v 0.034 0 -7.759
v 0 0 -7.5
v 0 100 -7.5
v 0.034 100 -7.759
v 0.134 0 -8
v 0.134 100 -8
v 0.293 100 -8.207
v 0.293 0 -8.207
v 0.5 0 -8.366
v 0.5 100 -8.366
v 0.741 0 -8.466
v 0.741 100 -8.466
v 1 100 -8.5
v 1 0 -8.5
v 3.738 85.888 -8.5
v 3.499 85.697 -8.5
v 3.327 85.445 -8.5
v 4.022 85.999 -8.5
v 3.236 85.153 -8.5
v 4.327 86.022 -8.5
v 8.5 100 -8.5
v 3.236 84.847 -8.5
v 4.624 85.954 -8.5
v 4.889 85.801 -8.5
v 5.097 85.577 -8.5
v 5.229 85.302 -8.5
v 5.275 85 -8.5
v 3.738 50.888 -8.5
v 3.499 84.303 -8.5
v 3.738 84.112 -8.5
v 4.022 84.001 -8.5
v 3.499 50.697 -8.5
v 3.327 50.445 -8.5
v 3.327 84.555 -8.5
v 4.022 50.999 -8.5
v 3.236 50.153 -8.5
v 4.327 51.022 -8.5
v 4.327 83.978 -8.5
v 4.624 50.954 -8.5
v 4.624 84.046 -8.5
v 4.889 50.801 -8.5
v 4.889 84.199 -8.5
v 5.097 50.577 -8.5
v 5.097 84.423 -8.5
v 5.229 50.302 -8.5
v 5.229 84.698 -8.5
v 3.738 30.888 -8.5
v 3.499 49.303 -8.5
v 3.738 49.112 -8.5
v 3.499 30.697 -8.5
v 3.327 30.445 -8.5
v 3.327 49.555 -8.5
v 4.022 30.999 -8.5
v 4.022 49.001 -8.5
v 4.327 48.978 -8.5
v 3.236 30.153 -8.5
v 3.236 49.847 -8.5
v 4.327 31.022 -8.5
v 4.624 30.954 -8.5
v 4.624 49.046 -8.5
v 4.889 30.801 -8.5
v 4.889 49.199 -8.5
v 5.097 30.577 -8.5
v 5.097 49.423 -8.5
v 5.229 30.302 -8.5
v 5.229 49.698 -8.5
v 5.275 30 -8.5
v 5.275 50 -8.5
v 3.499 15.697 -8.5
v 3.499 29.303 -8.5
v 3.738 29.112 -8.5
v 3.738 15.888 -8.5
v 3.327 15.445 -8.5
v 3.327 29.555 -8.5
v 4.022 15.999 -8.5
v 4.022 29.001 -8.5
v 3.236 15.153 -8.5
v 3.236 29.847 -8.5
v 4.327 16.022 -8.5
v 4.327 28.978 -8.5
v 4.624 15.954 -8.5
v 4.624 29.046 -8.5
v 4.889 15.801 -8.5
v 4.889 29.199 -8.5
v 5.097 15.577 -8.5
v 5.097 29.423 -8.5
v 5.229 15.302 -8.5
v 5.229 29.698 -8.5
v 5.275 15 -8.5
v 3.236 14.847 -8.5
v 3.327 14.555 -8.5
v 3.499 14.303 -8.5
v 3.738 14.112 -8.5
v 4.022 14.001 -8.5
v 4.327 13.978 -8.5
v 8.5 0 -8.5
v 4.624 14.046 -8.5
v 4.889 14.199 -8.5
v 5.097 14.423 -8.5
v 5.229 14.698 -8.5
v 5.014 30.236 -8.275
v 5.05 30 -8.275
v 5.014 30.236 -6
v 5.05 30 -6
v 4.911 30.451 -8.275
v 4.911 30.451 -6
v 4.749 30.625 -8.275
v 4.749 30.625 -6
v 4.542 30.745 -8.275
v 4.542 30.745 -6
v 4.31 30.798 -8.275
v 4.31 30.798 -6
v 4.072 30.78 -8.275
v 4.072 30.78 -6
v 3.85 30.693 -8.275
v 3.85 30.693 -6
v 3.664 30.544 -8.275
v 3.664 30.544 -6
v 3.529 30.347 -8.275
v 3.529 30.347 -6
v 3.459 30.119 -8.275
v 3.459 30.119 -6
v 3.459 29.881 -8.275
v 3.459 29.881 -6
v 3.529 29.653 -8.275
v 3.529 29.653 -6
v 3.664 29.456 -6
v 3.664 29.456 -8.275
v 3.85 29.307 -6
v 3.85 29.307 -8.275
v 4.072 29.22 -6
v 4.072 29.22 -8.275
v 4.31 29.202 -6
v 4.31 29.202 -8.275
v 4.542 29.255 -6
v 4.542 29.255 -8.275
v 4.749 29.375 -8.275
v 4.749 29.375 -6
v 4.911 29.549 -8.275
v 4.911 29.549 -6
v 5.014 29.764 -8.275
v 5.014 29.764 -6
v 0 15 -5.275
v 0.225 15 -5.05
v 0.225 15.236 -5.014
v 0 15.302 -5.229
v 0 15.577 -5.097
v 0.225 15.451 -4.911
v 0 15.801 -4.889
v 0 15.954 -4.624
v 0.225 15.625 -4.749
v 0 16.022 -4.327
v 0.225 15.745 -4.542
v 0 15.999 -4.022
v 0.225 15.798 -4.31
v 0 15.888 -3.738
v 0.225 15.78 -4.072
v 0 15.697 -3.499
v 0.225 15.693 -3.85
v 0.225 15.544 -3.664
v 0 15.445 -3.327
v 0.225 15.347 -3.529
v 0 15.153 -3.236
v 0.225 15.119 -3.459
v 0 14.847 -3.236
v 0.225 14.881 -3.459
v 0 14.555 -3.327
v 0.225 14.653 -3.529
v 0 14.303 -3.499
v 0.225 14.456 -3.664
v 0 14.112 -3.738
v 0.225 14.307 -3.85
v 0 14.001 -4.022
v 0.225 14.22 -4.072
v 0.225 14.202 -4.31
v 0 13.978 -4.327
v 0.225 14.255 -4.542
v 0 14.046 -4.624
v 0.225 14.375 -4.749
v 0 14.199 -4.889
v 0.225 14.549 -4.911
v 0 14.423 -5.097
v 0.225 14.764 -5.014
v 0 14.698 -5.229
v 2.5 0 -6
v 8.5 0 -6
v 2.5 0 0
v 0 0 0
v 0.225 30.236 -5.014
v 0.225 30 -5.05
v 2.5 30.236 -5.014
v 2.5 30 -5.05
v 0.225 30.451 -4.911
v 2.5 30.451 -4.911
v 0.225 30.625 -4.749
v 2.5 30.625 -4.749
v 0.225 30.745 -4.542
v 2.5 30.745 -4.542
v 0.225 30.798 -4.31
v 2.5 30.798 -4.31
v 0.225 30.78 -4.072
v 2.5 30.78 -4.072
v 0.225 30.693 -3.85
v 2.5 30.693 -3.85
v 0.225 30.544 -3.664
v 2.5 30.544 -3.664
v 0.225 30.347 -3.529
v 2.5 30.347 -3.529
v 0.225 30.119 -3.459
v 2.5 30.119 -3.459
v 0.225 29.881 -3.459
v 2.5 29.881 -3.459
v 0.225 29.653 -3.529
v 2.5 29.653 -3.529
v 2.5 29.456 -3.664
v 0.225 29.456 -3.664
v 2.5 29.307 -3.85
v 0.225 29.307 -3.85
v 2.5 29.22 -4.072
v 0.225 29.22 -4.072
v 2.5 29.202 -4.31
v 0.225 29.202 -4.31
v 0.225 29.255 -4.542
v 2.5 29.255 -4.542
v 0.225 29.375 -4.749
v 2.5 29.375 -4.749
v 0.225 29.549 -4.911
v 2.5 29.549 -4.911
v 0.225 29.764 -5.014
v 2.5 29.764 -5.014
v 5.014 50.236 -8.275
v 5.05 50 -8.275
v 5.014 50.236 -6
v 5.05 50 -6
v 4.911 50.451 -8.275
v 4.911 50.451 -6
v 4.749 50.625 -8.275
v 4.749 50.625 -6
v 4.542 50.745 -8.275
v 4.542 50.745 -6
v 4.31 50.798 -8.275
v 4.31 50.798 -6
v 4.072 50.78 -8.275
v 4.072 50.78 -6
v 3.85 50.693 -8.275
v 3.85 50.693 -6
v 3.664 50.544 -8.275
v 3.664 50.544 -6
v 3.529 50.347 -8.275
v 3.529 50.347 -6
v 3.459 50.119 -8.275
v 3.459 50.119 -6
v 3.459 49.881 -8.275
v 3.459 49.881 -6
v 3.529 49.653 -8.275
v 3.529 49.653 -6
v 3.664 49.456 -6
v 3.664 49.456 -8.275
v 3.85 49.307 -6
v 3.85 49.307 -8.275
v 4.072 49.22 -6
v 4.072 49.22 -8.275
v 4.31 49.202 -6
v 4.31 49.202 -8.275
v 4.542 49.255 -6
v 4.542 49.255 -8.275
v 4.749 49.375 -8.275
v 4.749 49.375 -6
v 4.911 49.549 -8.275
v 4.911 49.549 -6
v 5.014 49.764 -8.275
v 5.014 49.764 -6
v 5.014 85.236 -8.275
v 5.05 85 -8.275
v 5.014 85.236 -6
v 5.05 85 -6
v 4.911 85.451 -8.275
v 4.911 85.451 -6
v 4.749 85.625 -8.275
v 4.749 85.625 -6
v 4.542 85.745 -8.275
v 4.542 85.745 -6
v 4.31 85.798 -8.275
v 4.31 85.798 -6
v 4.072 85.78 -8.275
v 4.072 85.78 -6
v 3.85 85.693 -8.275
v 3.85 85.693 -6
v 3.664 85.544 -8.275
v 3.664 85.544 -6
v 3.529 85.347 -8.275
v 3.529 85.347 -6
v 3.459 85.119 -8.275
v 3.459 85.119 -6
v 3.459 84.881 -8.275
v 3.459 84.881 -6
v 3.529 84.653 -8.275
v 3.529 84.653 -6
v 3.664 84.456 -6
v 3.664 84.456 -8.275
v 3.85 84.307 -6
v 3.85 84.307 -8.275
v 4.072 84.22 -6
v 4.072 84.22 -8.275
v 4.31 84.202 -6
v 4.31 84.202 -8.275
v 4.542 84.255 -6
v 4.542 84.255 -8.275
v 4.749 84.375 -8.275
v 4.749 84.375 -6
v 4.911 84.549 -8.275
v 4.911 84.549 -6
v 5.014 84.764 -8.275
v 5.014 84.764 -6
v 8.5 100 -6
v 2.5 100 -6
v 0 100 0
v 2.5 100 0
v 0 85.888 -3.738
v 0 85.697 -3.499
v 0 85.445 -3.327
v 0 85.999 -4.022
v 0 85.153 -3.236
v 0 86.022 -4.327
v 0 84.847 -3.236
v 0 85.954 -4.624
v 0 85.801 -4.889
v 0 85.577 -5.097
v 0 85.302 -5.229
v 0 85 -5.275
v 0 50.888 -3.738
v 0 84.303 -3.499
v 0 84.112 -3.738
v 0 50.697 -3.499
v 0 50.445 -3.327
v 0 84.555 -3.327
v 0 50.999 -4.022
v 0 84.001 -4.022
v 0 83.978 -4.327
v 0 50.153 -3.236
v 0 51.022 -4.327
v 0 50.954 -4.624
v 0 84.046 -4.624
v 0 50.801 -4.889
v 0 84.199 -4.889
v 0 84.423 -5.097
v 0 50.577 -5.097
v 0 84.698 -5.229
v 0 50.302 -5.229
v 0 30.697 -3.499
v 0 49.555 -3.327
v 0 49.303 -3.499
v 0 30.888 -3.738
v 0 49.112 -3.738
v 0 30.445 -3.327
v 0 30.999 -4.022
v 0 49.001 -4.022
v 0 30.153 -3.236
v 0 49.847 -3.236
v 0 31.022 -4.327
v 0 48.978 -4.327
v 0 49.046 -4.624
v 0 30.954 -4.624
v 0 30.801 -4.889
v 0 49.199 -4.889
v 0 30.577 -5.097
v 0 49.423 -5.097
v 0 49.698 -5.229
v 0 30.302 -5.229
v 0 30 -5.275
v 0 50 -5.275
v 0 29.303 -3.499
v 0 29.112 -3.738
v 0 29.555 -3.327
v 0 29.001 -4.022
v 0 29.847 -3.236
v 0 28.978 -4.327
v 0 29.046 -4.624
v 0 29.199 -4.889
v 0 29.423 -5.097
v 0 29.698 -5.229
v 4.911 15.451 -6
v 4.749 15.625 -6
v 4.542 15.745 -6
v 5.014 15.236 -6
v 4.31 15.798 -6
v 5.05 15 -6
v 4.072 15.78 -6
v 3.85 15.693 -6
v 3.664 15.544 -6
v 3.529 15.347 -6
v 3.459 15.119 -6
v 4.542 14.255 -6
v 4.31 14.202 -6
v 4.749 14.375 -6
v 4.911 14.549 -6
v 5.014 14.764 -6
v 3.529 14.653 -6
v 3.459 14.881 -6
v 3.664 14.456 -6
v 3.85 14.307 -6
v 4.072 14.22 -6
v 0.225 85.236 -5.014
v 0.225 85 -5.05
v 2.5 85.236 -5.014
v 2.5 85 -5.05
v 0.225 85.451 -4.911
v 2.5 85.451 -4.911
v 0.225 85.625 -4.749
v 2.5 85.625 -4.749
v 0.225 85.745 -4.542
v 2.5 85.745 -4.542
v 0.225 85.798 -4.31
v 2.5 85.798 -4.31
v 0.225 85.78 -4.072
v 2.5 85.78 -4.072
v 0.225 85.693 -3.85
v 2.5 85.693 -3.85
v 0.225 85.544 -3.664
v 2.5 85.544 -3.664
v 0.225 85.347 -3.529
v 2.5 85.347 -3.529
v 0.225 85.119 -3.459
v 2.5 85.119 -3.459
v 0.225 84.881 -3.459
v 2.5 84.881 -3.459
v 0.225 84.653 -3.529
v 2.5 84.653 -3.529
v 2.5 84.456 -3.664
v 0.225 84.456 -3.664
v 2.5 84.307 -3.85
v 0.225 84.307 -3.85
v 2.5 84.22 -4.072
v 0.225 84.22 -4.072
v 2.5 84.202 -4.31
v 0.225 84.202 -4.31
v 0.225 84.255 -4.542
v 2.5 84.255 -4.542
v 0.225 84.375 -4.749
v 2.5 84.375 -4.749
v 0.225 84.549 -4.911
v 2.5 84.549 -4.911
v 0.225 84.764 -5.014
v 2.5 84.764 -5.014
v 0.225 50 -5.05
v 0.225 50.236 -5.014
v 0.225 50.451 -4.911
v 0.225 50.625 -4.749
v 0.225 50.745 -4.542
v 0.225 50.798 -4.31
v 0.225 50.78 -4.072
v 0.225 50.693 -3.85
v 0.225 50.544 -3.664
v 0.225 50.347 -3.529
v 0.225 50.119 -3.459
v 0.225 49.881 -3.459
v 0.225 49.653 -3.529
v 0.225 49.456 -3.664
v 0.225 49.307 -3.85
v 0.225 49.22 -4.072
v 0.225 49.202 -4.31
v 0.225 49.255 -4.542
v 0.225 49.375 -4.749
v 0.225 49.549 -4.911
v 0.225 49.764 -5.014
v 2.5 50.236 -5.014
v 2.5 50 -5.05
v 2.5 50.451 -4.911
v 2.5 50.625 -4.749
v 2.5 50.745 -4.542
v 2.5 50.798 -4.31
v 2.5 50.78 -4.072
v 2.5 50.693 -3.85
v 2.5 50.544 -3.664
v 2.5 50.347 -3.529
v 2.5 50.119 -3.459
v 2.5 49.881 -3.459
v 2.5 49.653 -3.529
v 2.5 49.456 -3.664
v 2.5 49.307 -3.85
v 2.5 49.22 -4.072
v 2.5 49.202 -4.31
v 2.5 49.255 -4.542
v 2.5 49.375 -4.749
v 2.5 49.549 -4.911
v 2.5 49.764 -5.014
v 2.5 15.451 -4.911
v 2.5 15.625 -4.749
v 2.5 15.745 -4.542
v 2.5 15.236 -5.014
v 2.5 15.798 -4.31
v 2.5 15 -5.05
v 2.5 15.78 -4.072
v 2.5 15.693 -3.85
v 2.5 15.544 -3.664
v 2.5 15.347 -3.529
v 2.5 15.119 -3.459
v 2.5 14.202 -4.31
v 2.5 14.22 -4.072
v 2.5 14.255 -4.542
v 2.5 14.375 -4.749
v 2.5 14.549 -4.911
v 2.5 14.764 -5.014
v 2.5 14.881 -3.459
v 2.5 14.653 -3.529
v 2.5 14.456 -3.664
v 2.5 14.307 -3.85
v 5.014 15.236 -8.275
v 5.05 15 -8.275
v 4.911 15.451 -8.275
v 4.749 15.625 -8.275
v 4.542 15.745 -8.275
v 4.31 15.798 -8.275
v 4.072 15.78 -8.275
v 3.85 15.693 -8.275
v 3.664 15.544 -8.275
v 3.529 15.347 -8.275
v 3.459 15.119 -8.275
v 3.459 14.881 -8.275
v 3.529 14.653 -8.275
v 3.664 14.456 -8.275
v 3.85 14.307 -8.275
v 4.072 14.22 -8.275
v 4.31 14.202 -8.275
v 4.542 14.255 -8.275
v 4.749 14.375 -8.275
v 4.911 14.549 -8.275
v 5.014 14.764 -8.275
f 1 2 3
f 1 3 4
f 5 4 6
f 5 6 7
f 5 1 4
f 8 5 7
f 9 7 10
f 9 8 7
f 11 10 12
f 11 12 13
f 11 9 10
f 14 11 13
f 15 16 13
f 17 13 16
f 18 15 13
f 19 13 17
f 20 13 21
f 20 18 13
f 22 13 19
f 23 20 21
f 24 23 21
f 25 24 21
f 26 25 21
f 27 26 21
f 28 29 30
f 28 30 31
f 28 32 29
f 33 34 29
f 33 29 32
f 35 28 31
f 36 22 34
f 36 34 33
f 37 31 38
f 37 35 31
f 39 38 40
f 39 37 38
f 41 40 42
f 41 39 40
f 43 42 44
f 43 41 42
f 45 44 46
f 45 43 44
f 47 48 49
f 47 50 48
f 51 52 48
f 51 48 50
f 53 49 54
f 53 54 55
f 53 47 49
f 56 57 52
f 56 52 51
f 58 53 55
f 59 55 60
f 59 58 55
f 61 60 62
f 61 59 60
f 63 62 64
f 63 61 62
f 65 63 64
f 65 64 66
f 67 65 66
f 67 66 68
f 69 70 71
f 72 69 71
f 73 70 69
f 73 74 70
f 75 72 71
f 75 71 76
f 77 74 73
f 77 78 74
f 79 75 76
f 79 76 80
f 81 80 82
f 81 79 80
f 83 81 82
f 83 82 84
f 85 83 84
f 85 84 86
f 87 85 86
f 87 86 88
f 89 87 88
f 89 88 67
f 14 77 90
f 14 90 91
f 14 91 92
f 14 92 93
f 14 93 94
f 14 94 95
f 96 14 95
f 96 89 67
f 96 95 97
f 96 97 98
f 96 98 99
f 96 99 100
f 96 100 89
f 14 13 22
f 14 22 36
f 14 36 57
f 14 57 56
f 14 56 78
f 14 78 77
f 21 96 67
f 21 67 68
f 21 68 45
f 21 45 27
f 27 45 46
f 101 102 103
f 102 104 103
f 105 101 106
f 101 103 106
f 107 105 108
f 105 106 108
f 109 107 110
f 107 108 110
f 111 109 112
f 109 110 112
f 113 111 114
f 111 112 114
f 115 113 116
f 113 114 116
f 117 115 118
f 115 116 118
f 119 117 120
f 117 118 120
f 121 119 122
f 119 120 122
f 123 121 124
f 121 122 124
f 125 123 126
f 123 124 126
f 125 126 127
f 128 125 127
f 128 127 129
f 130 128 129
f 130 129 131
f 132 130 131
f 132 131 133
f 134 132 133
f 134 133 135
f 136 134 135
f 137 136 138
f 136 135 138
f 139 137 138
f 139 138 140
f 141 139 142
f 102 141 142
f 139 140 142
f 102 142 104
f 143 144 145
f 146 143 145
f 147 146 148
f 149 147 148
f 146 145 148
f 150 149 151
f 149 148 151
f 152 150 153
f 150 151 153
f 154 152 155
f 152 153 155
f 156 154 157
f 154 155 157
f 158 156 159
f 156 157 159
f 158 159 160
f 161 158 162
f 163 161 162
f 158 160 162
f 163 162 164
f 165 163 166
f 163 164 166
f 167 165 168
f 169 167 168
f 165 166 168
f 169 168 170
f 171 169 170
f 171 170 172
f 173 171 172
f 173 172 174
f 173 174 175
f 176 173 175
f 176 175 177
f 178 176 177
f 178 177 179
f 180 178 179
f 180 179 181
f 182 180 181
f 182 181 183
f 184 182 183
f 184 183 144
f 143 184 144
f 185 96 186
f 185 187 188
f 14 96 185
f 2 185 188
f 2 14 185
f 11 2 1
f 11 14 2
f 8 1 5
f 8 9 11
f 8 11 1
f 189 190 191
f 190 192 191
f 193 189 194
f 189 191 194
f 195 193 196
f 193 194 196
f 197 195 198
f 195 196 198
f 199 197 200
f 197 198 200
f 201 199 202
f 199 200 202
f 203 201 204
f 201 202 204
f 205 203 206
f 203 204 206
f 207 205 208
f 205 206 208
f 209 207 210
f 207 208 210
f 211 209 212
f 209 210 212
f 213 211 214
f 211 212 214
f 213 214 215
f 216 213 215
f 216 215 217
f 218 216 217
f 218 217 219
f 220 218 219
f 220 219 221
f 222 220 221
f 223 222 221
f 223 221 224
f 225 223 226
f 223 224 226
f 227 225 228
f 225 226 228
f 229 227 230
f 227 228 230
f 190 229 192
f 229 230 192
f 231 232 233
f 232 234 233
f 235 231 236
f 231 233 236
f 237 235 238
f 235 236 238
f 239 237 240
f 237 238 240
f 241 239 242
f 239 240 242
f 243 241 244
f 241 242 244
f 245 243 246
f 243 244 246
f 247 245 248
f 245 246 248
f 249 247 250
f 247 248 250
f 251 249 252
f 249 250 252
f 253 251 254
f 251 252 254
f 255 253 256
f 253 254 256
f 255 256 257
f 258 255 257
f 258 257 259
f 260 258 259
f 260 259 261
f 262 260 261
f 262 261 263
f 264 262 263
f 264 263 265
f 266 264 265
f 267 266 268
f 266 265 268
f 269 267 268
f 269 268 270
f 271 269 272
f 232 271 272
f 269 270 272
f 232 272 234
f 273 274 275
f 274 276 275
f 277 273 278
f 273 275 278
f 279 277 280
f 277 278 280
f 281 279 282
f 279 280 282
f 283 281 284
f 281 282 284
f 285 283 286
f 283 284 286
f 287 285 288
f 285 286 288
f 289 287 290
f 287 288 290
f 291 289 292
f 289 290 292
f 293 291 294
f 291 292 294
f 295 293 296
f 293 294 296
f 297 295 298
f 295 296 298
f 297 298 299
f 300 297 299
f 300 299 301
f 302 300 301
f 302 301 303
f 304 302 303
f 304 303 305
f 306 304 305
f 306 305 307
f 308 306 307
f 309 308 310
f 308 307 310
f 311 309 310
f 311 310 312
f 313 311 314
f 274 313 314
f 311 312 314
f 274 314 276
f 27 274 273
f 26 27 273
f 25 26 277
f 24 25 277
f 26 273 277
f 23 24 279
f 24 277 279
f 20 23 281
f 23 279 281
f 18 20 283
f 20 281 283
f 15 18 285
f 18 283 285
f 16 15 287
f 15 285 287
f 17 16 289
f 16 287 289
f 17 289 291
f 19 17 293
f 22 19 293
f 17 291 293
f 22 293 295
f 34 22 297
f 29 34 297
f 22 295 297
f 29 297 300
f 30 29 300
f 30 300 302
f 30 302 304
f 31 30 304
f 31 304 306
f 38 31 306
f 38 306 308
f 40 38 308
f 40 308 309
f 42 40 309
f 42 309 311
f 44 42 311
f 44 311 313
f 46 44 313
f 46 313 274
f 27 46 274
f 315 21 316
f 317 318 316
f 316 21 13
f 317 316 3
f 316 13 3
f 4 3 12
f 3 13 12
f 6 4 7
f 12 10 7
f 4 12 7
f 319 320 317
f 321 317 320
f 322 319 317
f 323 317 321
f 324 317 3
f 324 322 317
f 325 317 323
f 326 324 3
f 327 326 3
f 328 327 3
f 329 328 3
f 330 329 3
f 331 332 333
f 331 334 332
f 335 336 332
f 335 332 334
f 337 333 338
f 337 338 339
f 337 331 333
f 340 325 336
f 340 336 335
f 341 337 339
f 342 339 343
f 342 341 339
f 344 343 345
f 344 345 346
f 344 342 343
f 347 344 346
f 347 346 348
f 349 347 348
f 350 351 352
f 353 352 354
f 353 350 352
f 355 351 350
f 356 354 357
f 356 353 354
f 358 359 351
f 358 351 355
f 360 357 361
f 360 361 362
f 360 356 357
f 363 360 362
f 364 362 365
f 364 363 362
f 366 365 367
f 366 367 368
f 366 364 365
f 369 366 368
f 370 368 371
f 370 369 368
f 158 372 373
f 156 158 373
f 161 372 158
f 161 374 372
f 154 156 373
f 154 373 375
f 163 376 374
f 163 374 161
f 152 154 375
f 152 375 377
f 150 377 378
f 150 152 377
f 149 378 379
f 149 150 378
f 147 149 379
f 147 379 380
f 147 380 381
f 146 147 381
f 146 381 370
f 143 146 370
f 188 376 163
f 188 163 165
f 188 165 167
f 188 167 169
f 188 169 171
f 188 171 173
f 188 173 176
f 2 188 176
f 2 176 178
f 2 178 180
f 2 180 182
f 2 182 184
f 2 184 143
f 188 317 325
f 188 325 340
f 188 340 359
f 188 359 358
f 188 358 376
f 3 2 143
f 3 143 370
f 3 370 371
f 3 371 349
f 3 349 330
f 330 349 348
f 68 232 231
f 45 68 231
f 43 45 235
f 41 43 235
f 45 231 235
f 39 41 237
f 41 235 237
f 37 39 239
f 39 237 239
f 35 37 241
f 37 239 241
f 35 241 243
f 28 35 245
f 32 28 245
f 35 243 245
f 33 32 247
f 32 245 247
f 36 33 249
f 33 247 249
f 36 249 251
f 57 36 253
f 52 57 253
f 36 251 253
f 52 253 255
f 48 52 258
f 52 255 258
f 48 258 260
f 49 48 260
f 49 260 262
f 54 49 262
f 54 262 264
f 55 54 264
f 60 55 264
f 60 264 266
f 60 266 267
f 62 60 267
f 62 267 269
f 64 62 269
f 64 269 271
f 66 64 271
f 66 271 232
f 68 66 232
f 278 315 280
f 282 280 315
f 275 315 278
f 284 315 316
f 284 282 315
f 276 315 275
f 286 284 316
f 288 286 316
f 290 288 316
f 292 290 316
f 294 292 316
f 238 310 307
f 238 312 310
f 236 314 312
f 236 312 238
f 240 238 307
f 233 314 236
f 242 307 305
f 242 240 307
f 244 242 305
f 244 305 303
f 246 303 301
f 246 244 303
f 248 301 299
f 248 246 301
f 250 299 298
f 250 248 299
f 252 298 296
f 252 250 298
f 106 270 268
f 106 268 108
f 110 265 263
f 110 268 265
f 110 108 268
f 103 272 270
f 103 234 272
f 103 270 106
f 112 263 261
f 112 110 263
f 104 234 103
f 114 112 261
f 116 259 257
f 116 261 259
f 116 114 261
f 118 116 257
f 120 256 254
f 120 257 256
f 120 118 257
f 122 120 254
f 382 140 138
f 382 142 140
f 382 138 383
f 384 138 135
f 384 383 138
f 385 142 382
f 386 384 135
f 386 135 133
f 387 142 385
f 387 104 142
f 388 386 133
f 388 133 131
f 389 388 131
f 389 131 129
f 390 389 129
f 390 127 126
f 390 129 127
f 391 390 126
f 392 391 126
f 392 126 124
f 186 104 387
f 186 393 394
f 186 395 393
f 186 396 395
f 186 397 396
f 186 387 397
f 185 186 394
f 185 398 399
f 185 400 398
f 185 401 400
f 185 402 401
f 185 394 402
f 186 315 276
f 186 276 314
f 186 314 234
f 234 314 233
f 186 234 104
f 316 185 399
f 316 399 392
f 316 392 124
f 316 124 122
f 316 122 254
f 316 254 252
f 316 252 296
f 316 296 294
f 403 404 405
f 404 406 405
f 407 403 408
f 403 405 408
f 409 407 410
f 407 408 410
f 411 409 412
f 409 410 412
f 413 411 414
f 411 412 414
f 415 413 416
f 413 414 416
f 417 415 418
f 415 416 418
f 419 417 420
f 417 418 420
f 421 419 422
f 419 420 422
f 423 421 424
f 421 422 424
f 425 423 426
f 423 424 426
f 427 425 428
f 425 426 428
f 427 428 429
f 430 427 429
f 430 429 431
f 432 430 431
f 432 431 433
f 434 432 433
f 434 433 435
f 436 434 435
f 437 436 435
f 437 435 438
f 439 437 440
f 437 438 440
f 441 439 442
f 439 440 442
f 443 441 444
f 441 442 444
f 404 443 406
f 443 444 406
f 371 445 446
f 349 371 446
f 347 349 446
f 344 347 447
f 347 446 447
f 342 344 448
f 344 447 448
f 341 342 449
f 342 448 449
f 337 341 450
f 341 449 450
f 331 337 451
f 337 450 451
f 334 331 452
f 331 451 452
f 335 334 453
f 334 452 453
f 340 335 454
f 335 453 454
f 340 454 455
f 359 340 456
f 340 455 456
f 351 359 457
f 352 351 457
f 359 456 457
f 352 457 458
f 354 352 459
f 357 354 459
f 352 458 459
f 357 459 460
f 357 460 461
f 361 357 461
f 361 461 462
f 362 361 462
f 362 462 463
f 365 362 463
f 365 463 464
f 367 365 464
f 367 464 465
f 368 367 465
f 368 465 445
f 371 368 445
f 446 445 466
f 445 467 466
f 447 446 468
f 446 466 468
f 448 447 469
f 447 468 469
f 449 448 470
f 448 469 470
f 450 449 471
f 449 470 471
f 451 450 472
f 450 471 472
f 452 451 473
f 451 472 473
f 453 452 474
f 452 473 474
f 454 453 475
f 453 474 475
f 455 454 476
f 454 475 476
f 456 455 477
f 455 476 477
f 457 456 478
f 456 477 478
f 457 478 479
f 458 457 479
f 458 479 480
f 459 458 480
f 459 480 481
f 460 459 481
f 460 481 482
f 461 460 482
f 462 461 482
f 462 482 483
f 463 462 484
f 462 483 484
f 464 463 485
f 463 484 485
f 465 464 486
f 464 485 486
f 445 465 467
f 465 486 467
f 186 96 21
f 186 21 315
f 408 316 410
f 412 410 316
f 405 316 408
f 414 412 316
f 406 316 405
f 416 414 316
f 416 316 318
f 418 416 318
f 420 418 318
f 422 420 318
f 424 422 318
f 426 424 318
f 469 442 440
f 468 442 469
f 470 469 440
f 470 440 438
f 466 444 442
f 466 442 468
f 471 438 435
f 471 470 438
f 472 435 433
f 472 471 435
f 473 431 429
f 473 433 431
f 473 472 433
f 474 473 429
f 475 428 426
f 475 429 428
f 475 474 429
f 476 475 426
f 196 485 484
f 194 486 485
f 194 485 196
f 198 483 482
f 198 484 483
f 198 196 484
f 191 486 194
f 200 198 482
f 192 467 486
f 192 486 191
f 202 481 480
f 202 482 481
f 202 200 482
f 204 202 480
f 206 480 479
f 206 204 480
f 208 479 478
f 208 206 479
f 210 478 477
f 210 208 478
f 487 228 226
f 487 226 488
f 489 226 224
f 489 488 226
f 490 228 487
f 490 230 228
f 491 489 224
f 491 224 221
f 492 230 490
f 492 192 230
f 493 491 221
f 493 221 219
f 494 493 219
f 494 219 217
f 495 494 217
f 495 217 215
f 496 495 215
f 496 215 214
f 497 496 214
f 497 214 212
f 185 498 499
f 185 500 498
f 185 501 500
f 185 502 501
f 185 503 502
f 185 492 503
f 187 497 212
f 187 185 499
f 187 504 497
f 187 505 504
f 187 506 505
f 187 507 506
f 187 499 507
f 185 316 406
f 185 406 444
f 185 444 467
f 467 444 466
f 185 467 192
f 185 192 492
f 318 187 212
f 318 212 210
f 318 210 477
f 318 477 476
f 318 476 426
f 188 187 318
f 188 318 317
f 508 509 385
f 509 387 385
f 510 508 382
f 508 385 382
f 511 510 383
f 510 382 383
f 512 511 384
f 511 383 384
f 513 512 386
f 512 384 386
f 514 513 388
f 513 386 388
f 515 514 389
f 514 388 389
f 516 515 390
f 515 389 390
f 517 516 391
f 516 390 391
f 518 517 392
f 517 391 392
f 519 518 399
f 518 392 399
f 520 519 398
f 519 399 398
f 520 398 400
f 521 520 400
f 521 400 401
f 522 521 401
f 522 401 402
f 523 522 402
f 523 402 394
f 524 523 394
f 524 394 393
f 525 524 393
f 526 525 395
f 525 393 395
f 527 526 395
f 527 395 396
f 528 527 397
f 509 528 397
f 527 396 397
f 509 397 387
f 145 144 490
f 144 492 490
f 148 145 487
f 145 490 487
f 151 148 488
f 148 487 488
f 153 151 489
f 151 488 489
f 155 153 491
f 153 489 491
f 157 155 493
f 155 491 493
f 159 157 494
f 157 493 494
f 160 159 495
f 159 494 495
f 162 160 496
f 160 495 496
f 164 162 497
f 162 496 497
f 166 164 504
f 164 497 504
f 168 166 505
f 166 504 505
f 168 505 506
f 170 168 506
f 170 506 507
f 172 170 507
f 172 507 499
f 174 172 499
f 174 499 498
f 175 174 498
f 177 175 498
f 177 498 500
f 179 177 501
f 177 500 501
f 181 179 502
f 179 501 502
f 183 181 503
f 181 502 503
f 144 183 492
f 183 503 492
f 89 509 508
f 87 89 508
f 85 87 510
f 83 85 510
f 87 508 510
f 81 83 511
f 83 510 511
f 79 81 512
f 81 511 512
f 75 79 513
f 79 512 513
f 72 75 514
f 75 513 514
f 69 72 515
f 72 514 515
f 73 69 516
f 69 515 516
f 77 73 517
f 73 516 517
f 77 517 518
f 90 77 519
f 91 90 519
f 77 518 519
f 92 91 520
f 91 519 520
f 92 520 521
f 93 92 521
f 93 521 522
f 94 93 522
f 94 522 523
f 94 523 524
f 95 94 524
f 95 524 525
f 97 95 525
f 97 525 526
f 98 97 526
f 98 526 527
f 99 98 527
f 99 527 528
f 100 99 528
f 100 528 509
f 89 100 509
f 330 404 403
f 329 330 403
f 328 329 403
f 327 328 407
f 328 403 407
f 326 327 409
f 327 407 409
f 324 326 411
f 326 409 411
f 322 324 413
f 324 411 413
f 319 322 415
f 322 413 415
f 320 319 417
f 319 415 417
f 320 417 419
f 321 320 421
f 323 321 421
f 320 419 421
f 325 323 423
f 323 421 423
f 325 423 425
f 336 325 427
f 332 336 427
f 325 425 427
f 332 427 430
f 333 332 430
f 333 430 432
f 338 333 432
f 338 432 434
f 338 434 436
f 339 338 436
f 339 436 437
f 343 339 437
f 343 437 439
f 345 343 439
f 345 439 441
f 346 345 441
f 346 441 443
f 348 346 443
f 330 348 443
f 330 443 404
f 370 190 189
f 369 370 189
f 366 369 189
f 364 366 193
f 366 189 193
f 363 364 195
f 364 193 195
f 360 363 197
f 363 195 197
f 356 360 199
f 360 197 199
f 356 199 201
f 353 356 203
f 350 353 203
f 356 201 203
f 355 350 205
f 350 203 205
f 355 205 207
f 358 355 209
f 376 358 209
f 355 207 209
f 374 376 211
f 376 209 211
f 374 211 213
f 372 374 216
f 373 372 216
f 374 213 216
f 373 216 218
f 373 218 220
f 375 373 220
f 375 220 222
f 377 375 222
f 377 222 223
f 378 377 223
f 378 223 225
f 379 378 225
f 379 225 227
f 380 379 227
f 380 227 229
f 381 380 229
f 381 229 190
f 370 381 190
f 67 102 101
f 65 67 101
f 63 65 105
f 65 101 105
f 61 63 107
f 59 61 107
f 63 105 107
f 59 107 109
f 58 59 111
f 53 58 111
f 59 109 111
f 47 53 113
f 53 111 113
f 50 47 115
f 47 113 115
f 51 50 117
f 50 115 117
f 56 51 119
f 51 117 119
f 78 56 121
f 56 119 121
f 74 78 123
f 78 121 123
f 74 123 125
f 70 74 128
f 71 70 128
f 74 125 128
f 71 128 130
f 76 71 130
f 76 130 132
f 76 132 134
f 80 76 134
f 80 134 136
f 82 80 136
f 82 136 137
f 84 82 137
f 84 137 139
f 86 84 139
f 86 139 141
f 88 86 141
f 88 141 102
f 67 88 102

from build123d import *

# Parameters (mm, degrees)
BOSS_EXTRUDE1_DEPTH             = 100
M2X0_4_TAPPED_HOLE2_D           = 1.6
M2X0_4_TAPPED_HOLE2_CSINK_D     = 2.05
M2X0_4_TAPPED_HOLE2_CSINK_ANGLE = 90
LPATTERN1_COUNT                 = 3
LPATTERN1_PITCH                 = 35
M2X0_4_TAPPED_HOLE3_D           = 1.6
M2X0_4_TAPPED_HOLE3_CSINK_D     = 2.05
M2X0_4_TAPPED_HOLE3_CSINK_ANGLE = 90
LPATTERN2_COUNT                 = 3
LPATTERN2_PITCH                 = 35
M2X0_4_TAPPED_HOLE4_D           = 1.6
M2X0_4_TAPPED_HOLE4_CSINK_D     = 2.05
M2X0_4_TAPPED_HOLE4_CSINK_ANGLE = 90
M2X0_4_TAPPED_HOLE5_D           = 1.6
M2X0_4_TAPPED_HOLE5_CSINK_D     = 2.05
M2X0_4_TAPPED_HOLE5_CSINK_ANGLE = 90


with BuildPart() as part:
    # Sketch2 → Boss-Extrude1 (new body)
    with BuildSketch(Plane(origin=(0, 0, 0), x_dir=(1, 0, 0), z_dir=(0, 1, 0))):
        with BuildLine():
            Line((0, 0), (0, 7.5))
            ThreePointArc((0, 7.5), (0.292893219, 8.207106781), (1, 8.5))
            Line((1, 8.5), (8.5, 8.5))
            Line((8.5, 8.5), (8.5, 6))
            Line((8.5, 6), (2.5, 6))
            Line((2.5, 6), (2.5, 0))
            Line((2.5, 0), (0, 0))
        make_face()
    extrude(amount=BOSS_EXTRUDE1_DEPTH)

    # M2x0.4 Tapped Hole2 (through all)
    with Locations(Plane(origin=(0, 0, -8.5), x_dir=(-1, 0, 0), z_dir=(0, 0, -1))):
        with Locations((-4.25, 15)):
            m2x0_4_tapped_hole2 = CounterSinkHole(M2X0_4_TAPPED_HOLE2_D / 2, M2X0_4_TAPPED_HOLE2_CSINK_D / 2, counter_sink_angle=M2X0_4_TAPPED_HOLE2_CSINK_ANGLE)

    # LPattern1: M2x0.4 Tapped Hole2 ×3
    with Locations(*[(0, i * LPATTERN1_PITCH, 0) for i in range(1, LPATTERN1_COUNT)]):
        add(m2x0_4_tapped_hole2, mode=Mode.SUBTRACT)

    # M2x0.4 Tapped Hole3 (through all)
    with Locations(Plane.ZY):
        with Locations((-4.25, 15)):
            m2x0_4_tapped_hole3 = CounterSinkHole(M2X0_4_TAPPED_HOLE3_D / 2, M2X0_4_TAPPED_HOLE3_CSINK_D / 2, counter_sink_angle=M2X0_4_TAPPED_HOLE3_CSINK_ANGLE)

    # LPattern2: M2x0.4 Tapped Hole3 ×3
    with Locations(*[(0, i * LPATTERN2_PITCH, 0) for i in range(1, LPATTERN2_COUNT)]):
        add(m2x0_4_tapped_hole3, mode=Mode.SUBTRACT)

    # M2x0.4 Tapped Hole4 (through all)
    with Locations(Plane(origin=(0, 0, -8.5), x_dir=(-1, 0, 0), z_dir=(0, 0, -1))):
        with Locations((-4.25, 30)):
            CounterSinkHole(M2X0_4_TAPPED_HOLE4_D / 2, M2X0_4_TAPPED_HOLE4_CSINK_D / 2, counter_sink_angle=M2X0_4_TAPPED_HOLE4_CSINK_ANGLE)

    # M2x0.4 Tapped Hole5 (through all)
    with Locations(Plane.ZY):
        with Locations((-4.25, 30)):
            CounterSinkHole(M2X0_4_TAPPED_HOLE5_D / 2, M2X0_4_TAPPED_HOLE5_CSINK_D / 2, counter_sink_angle=M2X0_4_TAPPED_HOLE5_CSINK_ANGLE)


solid = part.part
